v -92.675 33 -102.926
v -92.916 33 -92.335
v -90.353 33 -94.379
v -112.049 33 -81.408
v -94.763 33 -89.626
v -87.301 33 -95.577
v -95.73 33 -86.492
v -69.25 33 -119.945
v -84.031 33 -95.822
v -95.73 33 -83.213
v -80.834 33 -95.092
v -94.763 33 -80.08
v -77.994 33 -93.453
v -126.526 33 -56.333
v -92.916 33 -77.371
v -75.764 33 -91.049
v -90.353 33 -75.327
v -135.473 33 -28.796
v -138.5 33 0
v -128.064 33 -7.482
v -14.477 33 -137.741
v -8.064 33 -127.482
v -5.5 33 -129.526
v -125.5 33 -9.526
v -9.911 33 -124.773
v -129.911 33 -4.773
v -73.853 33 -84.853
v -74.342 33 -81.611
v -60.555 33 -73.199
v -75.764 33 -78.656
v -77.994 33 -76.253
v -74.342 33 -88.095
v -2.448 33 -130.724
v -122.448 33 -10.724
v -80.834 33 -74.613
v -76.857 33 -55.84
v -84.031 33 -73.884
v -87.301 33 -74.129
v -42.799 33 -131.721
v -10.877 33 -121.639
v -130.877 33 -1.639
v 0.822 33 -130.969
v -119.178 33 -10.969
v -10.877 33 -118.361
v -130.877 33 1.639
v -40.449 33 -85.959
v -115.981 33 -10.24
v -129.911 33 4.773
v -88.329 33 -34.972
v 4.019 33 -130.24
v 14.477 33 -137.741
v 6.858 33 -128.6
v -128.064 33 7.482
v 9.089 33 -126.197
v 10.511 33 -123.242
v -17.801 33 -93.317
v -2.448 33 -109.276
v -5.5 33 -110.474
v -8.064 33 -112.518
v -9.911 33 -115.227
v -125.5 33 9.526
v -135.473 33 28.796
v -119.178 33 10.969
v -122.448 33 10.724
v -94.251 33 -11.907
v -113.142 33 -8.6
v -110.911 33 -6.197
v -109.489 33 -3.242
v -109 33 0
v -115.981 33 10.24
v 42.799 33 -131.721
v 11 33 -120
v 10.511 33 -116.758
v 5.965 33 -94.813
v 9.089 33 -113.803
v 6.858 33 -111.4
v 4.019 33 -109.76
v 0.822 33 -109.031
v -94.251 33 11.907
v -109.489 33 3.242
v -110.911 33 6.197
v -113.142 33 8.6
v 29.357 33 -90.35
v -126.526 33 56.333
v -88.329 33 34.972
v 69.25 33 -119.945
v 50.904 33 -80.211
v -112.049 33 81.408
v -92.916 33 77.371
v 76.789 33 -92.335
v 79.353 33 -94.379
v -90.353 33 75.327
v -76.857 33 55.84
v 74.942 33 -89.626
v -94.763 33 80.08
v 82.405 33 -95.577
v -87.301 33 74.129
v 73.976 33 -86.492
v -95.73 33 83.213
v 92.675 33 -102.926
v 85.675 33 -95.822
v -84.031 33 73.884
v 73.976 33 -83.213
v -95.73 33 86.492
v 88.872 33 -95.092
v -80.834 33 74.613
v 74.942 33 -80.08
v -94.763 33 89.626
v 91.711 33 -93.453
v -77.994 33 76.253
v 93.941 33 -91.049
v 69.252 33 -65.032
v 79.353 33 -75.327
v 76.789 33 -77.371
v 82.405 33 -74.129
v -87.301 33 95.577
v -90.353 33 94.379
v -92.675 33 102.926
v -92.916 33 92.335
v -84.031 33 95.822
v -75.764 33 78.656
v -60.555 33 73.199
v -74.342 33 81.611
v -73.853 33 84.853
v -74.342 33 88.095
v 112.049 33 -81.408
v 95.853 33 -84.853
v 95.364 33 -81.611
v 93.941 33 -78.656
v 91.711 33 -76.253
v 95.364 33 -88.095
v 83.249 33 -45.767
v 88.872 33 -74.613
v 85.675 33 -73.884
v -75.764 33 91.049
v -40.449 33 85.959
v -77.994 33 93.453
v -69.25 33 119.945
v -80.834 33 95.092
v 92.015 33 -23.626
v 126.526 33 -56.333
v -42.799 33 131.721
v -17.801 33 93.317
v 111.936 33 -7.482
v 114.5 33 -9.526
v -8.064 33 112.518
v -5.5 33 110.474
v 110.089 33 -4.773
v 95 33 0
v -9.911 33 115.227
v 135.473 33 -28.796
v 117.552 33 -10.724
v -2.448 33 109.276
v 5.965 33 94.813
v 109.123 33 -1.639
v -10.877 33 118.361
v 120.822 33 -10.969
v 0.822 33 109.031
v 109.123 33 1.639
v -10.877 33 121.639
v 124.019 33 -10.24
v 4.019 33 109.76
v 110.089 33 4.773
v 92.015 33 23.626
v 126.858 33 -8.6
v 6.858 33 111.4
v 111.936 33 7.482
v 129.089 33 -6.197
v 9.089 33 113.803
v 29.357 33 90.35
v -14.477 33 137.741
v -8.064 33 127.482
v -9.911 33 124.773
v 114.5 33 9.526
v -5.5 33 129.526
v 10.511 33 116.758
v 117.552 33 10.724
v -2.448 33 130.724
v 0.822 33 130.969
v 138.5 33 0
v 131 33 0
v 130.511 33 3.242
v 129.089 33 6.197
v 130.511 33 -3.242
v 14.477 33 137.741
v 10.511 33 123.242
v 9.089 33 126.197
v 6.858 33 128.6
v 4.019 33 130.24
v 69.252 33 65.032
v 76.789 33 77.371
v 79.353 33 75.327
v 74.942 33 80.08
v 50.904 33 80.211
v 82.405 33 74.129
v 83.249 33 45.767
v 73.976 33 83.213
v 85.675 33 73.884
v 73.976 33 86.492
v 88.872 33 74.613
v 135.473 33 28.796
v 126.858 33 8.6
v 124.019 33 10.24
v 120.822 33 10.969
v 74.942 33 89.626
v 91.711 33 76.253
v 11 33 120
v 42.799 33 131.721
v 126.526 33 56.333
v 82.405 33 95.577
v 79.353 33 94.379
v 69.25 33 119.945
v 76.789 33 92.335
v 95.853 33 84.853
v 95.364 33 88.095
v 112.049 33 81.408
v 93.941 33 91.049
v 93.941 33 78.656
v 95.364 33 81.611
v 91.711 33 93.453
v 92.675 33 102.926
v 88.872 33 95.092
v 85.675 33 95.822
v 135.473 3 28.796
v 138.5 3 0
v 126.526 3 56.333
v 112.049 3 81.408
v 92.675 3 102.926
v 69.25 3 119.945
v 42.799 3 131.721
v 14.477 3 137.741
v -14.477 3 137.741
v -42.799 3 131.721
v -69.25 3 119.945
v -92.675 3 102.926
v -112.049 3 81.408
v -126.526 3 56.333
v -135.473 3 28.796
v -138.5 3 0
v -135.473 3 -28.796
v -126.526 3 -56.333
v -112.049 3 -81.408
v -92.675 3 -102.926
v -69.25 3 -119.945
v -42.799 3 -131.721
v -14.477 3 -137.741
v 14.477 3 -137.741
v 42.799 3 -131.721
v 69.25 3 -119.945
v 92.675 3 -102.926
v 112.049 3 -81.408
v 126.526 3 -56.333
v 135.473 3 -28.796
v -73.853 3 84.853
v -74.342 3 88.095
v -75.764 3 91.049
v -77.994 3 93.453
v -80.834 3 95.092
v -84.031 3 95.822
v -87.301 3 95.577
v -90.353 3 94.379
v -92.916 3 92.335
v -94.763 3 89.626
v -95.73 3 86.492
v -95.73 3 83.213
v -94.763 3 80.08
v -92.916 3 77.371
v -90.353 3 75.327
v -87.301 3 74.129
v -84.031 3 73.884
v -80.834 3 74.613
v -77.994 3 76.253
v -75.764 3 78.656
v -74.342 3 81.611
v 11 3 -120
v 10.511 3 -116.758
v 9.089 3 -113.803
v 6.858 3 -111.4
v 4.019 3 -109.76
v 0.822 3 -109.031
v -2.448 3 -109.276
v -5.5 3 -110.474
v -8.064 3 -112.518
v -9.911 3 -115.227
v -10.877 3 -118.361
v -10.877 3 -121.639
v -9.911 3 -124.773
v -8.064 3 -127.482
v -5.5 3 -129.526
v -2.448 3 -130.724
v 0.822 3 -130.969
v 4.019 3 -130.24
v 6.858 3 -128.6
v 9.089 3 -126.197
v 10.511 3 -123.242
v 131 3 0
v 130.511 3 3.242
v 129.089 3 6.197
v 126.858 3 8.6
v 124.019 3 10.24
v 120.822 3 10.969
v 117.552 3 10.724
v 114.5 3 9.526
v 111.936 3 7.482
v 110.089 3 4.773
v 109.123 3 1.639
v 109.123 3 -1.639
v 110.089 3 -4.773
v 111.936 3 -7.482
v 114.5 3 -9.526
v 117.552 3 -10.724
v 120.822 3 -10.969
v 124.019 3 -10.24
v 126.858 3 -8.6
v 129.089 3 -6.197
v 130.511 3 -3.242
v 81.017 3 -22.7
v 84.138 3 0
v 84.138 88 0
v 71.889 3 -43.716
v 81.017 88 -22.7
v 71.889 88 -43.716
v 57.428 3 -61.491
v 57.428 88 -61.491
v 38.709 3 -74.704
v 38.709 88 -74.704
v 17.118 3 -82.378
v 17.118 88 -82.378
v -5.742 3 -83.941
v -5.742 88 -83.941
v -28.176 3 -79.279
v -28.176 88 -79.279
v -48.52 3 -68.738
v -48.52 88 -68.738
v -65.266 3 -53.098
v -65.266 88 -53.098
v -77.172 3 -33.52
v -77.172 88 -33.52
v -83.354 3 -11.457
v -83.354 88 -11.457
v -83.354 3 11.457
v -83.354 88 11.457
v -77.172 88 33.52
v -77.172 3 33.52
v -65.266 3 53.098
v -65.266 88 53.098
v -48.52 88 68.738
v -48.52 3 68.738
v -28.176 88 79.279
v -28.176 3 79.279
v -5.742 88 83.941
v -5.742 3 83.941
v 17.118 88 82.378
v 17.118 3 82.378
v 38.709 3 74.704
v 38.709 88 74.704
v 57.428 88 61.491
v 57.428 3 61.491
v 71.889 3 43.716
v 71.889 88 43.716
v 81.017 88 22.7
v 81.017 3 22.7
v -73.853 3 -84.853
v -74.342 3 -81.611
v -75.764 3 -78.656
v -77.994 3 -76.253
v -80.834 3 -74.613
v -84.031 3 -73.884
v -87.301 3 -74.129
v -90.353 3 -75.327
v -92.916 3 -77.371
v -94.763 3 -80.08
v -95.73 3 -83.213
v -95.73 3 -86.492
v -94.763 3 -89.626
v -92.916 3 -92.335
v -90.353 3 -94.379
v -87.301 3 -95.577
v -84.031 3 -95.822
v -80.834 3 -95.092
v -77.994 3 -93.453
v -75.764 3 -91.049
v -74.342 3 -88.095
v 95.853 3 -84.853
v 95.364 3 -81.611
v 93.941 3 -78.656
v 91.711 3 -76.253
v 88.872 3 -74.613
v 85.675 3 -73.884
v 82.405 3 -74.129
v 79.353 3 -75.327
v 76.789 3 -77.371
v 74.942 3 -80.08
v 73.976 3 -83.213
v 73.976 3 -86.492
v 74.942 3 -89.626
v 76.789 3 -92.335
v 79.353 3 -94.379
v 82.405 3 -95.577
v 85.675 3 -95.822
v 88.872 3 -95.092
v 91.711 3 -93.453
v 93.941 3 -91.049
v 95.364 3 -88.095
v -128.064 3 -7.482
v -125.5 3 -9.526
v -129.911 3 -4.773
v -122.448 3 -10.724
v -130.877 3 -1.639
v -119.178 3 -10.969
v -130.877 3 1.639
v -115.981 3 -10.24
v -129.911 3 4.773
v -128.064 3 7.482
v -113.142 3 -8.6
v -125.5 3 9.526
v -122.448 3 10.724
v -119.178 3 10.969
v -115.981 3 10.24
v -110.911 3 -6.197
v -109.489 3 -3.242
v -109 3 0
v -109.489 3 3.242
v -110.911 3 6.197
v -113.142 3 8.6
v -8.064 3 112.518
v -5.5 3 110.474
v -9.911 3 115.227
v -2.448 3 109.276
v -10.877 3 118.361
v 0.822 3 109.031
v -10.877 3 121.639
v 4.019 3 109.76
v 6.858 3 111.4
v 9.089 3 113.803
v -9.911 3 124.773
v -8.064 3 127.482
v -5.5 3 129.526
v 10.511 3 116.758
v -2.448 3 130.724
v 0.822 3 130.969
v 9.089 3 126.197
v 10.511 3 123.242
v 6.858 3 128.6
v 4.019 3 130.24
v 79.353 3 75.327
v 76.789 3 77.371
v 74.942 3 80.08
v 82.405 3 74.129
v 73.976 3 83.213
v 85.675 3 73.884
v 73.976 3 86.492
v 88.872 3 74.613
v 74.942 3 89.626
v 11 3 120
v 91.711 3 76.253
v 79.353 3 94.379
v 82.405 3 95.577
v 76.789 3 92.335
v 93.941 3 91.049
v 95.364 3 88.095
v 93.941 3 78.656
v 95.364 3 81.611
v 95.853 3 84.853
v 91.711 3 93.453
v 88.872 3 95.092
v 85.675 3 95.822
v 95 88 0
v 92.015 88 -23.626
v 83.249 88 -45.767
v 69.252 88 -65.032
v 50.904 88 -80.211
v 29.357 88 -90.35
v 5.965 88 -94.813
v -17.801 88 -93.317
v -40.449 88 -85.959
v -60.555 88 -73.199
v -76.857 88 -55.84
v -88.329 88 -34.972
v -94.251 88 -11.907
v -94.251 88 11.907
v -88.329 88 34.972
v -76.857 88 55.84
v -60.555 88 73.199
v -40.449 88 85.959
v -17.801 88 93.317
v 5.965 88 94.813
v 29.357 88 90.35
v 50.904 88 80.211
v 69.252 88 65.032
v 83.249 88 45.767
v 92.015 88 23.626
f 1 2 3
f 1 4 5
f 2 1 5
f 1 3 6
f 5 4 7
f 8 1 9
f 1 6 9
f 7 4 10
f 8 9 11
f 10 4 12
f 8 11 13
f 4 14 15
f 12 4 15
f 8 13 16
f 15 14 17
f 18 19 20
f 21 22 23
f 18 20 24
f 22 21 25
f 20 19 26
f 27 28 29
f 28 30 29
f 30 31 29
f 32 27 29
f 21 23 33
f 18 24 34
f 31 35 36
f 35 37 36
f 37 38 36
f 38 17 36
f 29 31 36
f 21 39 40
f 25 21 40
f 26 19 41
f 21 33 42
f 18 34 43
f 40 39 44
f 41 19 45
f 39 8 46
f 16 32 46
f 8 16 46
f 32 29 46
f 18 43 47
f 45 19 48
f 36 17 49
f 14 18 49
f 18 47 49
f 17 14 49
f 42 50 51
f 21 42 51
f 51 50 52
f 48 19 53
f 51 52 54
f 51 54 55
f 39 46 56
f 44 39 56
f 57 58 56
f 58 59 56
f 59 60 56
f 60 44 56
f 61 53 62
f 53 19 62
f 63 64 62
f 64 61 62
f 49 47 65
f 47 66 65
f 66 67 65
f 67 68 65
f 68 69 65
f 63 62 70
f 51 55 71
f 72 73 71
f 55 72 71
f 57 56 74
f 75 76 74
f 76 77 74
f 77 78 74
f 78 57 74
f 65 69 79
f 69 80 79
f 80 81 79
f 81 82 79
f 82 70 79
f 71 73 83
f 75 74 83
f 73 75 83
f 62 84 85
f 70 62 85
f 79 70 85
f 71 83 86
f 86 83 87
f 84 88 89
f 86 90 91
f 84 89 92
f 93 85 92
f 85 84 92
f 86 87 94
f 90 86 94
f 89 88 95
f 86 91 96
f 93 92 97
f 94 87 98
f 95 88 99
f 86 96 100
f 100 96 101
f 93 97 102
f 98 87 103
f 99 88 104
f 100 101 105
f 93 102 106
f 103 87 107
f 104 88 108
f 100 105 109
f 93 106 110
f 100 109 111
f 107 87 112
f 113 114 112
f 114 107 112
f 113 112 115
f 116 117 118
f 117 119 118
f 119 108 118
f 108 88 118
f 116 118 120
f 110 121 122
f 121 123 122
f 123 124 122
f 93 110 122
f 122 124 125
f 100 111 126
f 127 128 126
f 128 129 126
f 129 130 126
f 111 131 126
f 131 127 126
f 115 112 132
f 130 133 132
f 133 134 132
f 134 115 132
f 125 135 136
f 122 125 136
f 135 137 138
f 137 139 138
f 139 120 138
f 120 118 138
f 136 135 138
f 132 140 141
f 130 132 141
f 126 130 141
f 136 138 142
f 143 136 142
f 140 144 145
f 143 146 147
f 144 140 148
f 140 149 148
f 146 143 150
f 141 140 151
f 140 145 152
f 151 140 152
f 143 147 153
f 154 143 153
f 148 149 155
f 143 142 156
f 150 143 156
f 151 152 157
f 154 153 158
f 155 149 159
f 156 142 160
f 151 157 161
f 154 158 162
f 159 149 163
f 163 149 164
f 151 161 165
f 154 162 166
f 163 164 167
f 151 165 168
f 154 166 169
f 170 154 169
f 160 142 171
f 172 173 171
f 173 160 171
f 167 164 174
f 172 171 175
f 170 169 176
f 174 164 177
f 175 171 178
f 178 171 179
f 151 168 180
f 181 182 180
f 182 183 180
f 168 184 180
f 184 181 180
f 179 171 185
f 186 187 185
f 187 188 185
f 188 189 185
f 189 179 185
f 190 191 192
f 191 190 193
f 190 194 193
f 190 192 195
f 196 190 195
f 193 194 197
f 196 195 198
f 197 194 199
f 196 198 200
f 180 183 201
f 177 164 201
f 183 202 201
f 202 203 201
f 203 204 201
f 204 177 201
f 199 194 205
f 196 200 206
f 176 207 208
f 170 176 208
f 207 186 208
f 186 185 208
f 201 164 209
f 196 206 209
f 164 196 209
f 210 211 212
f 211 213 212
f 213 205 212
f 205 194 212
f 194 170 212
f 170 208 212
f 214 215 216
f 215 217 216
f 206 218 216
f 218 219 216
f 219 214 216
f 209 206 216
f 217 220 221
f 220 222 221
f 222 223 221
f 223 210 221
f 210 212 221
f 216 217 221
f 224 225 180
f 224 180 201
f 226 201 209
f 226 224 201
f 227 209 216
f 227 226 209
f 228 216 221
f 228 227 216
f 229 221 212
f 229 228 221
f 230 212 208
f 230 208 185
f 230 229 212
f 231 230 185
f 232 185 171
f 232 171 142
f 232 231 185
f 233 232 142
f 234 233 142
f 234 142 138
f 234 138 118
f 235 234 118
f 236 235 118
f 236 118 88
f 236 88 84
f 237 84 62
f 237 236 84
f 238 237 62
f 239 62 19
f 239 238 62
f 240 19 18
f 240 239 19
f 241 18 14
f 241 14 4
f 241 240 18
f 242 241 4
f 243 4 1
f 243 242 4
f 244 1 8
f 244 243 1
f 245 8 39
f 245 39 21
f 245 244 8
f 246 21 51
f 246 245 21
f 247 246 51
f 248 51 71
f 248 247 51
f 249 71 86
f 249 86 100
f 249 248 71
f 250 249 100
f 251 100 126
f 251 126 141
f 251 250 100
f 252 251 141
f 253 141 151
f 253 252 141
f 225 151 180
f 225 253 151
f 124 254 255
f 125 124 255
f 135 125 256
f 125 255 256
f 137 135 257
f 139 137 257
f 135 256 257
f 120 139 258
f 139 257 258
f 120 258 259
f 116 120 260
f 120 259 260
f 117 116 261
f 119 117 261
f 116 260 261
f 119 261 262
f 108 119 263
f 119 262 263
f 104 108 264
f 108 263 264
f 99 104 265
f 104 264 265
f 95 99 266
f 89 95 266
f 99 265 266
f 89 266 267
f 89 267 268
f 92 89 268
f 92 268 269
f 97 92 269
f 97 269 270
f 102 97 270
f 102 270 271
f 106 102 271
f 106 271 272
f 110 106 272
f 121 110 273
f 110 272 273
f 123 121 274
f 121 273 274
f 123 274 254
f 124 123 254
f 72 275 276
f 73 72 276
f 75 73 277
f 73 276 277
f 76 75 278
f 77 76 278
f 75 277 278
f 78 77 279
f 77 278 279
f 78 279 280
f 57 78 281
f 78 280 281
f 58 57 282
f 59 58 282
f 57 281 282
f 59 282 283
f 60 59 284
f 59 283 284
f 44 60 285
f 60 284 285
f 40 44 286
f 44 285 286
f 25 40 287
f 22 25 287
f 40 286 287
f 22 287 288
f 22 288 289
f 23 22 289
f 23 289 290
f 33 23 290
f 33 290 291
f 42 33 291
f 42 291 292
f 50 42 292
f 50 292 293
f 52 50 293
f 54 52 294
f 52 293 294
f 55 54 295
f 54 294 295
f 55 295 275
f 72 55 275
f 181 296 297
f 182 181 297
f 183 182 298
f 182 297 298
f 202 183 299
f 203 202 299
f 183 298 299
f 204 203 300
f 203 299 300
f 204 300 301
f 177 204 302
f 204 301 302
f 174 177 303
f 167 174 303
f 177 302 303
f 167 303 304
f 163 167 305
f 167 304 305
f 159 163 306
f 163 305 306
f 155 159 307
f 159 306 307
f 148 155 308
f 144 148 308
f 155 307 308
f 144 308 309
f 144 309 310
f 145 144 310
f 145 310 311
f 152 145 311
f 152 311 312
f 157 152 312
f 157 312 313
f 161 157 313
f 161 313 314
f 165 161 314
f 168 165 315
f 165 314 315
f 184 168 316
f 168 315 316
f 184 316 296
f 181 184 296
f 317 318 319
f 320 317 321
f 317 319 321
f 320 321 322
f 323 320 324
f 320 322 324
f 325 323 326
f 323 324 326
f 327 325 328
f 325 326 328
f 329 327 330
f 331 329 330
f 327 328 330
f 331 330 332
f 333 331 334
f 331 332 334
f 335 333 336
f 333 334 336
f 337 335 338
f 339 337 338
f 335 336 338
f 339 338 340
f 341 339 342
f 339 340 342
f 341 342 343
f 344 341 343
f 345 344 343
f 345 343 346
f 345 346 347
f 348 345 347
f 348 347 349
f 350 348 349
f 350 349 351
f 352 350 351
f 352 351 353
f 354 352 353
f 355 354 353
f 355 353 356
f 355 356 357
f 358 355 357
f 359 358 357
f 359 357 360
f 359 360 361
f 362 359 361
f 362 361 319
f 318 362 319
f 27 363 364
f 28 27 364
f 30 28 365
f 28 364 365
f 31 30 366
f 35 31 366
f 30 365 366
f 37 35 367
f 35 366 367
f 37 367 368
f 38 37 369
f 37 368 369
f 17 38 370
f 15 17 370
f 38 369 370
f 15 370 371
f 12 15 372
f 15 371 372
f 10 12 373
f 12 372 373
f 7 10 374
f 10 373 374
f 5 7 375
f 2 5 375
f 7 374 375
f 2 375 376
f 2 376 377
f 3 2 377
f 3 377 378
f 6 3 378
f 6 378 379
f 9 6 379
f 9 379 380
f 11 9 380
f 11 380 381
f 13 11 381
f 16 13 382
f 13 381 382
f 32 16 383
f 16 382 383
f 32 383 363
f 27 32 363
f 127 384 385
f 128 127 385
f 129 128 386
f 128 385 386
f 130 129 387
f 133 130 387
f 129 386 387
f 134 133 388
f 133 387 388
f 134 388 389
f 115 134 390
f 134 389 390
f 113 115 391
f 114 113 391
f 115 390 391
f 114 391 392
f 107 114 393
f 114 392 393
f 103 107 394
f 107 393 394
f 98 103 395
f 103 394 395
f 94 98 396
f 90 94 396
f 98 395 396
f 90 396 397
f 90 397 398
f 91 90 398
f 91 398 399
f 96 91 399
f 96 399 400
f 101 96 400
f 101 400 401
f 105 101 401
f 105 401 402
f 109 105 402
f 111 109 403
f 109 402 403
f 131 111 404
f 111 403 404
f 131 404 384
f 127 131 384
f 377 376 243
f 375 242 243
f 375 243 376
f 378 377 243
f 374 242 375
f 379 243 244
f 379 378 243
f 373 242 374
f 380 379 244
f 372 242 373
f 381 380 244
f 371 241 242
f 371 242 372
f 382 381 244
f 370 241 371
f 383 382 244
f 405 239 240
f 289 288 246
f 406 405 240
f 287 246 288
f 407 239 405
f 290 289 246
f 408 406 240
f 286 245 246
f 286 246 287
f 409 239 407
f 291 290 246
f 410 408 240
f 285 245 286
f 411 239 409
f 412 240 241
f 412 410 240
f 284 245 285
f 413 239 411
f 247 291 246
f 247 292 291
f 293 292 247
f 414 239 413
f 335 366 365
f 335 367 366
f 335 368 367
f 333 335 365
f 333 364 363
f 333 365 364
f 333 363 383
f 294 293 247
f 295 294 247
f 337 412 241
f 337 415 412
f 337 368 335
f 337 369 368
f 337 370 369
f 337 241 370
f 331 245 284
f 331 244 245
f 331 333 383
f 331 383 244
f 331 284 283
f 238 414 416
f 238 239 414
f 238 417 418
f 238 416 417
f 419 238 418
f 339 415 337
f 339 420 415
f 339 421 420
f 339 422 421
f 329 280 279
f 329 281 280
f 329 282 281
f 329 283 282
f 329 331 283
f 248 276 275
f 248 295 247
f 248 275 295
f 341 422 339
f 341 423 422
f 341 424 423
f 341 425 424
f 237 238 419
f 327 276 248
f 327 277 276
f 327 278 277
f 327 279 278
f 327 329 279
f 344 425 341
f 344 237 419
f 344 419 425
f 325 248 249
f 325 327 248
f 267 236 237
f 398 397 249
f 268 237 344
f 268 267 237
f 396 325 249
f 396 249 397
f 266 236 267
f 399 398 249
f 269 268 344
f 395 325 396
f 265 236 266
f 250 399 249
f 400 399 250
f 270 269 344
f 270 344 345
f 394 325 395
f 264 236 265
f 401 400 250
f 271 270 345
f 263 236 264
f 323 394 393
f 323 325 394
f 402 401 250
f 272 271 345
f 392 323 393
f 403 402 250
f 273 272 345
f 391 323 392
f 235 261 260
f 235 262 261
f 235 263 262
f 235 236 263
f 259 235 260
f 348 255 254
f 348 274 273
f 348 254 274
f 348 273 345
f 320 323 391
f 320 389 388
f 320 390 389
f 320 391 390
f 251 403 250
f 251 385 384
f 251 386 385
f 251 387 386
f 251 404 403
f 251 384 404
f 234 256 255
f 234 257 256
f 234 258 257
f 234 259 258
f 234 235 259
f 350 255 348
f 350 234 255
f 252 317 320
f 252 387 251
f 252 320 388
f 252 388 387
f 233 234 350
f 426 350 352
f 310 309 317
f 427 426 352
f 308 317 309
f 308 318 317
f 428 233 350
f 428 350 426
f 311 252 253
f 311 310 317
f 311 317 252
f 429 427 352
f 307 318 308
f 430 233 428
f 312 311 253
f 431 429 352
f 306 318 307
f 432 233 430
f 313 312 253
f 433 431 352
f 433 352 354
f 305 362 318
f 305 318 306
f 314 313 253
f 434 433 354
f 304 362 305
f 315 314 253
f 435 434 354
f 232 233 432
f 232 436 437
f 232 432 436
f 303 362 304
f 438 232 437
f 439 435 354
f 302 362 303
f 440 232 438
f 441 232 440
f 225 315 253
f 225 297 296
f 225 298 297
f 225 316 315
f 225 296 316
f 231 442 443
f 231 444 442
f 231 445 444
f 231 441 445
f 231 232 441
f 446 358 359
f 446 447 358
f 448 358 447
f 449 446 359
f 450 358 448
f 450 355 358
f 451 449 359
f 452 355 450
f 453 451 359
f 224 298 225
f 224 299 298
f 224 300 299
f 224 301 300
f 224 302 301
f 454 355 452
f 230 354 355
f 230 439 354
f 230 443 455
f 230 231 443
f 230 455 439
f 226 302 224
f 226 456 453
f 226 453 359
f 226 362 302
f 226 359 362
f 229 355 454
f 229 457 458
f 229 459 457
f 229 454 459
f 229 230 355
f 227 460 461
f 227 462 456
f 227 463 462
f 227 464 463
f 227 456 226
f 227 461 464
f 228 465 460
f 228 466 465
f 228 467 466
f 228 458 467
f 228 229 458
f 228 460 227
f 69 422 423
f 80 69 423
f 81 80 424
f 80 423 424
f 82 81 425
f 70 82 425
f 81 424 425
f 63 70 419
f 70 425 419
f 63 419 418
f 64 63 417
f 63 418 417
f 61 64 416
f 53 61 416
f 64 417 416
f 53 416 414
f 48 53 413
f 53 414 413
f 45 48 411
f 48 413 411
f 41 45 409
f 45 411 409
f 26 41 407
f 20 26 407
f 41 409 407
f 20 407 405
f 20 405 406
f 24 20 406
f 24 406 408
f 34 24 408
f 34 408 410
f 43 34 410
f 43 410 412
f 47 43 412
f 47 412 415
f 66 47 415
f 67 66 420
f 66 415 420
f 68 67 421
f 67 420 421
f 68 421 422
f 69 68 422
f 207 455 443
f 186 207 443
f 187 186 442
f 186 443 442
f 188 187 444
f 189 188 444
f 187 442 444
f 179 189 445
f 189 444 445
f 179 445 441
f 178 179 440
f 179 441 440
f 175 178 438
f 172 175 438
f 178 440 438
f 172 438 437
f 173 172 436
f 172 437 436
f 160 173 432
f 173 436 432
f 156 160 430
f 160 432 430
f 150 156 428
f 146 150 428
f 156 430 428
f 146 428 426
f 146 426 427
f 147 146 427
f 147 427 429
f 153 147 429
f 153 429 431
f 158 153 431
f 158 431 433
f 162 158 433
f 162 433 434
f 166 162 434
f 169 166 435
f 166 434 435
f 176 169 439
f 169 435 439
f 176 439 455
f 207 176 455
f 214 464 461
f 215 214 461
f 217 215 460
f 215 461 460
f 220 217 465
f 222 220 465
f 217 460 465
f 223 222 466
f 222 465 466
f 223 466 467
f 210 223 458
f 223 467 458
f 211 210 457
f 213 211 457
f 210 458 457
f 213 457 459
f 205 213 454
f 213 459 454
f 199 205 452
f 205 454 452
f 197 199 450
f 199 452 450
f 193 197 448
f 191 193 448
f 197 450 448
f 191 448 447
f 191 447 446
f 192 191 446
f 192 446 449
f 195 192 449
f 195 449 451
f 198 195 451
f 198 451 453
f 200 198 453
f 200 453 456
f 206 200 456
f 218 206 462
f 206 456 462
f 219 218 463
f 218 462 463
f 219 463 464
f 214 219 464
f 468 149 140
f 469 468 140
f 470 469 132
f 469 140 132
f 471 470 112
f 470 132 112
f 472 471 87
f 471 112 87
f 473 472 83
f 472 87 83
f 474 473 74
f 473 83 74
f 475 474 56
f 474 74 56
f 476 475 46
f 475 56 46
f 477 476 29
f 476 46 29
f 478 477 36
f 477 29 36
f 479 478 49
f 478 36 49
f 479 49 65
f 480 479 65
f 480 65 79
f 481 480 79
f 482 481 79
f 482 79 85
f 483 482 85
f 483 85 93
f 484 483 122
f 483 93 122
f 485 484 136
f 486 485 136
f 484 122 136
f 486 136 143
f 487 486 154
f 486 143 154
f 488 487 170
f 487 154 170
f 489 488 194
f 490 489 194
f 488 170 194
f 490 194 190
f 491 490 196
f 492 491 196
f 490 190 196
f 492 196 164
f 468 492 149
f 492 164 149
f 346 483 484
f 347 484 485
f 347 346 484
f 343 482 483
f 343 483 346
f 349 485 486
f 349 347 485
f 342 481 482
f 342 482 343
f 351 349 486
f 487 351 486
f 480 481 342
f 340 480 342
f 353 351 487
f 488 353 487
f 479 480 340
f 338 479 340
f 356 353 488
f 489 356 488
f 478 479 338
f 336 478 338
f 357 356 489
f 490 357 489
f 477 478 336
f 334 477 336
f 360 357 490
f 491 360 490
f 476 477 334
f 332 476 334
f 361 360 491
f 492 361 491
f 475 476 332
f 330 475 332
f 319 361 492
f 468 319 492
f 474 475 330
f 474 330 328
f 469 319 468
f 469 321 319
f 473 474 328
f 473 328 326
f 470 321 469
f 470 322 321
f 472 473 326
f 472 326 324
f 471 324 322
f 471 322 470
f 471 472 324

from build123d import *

# Parameters (mm, degrees)
SKETCH003_R   = 138.5
SKETCH003_R_2 = 11
PAD002_DEPTH  = 30
SKETCH004_R   = 95
PAD003_DEPTH  = 55
SKETCH005_R   = 84.1375
POCKET_DEPTH  = 85.001


with BuildPart() as part:
    # Sketch003 → Pad002 (new body)
    with BuildSketch(Plane.XZ.offset(-3)):
        Circle(SKETCH003_R)
        with Locations((-120, 0)):
            Circle(SKETCH003_R_2, mode=Mode.SUBTRACT)
        with Locations((-84.852814, 84.852814)):
            Circle(SKETCH003_R_2, mode=Mode.SUBTRACT)
        with Locations((0, 120)):
            Circle(SKETCH003_R_2, mode=Mode.SUBTRACT)
        with Locations((84.852814, 84.852814)):
            Circle(SKETCH003_R_2, mode=Mode.SUBTRACT)
        with Locations((120, 0)):
            Circle(SKETCH003_R_2, mode=Mode.SUBTRACT)
        with Locations((84.852814, -84.852814)):
            Circle(SKETCH003_R_2, mode=Mode.SUBTRACT)
        with Locations((0, -120)):
            Circle(SKETCH003_R_2, mode=Mode.SUBTRACT)
        with Locations((-84.852814, -84.852814)):
            Circle(SKETCH003_R_2, mode=Mode.SUBTRACT)
    extrude(amount=-PAD002_DEPTH)

    # Sketch004 (on Face11 of Pad002) → Pad003 (join)
    with BuildSketch(Plane(origin=(0, 33, 0), x_dir=(1, 0, 0), z_dir=(0, 1, 0))):
        Circle(SKETCH004_R)
    extrude(amount=PAD003_DEPTH)

    # Sketch005 (on Face13 of Pad003) → Pocket (cut, through all)
    with BuildSketch(Plane(origin=(0, 88, 0), x_dir=(1, 0, 0), z_dir=(0, 1, 0))):
        Circle(SKETCH005_R)
    extrude(amount=-POCKET_DEPTH, mode=Mode.SUBTRACT)


solid = part.part
